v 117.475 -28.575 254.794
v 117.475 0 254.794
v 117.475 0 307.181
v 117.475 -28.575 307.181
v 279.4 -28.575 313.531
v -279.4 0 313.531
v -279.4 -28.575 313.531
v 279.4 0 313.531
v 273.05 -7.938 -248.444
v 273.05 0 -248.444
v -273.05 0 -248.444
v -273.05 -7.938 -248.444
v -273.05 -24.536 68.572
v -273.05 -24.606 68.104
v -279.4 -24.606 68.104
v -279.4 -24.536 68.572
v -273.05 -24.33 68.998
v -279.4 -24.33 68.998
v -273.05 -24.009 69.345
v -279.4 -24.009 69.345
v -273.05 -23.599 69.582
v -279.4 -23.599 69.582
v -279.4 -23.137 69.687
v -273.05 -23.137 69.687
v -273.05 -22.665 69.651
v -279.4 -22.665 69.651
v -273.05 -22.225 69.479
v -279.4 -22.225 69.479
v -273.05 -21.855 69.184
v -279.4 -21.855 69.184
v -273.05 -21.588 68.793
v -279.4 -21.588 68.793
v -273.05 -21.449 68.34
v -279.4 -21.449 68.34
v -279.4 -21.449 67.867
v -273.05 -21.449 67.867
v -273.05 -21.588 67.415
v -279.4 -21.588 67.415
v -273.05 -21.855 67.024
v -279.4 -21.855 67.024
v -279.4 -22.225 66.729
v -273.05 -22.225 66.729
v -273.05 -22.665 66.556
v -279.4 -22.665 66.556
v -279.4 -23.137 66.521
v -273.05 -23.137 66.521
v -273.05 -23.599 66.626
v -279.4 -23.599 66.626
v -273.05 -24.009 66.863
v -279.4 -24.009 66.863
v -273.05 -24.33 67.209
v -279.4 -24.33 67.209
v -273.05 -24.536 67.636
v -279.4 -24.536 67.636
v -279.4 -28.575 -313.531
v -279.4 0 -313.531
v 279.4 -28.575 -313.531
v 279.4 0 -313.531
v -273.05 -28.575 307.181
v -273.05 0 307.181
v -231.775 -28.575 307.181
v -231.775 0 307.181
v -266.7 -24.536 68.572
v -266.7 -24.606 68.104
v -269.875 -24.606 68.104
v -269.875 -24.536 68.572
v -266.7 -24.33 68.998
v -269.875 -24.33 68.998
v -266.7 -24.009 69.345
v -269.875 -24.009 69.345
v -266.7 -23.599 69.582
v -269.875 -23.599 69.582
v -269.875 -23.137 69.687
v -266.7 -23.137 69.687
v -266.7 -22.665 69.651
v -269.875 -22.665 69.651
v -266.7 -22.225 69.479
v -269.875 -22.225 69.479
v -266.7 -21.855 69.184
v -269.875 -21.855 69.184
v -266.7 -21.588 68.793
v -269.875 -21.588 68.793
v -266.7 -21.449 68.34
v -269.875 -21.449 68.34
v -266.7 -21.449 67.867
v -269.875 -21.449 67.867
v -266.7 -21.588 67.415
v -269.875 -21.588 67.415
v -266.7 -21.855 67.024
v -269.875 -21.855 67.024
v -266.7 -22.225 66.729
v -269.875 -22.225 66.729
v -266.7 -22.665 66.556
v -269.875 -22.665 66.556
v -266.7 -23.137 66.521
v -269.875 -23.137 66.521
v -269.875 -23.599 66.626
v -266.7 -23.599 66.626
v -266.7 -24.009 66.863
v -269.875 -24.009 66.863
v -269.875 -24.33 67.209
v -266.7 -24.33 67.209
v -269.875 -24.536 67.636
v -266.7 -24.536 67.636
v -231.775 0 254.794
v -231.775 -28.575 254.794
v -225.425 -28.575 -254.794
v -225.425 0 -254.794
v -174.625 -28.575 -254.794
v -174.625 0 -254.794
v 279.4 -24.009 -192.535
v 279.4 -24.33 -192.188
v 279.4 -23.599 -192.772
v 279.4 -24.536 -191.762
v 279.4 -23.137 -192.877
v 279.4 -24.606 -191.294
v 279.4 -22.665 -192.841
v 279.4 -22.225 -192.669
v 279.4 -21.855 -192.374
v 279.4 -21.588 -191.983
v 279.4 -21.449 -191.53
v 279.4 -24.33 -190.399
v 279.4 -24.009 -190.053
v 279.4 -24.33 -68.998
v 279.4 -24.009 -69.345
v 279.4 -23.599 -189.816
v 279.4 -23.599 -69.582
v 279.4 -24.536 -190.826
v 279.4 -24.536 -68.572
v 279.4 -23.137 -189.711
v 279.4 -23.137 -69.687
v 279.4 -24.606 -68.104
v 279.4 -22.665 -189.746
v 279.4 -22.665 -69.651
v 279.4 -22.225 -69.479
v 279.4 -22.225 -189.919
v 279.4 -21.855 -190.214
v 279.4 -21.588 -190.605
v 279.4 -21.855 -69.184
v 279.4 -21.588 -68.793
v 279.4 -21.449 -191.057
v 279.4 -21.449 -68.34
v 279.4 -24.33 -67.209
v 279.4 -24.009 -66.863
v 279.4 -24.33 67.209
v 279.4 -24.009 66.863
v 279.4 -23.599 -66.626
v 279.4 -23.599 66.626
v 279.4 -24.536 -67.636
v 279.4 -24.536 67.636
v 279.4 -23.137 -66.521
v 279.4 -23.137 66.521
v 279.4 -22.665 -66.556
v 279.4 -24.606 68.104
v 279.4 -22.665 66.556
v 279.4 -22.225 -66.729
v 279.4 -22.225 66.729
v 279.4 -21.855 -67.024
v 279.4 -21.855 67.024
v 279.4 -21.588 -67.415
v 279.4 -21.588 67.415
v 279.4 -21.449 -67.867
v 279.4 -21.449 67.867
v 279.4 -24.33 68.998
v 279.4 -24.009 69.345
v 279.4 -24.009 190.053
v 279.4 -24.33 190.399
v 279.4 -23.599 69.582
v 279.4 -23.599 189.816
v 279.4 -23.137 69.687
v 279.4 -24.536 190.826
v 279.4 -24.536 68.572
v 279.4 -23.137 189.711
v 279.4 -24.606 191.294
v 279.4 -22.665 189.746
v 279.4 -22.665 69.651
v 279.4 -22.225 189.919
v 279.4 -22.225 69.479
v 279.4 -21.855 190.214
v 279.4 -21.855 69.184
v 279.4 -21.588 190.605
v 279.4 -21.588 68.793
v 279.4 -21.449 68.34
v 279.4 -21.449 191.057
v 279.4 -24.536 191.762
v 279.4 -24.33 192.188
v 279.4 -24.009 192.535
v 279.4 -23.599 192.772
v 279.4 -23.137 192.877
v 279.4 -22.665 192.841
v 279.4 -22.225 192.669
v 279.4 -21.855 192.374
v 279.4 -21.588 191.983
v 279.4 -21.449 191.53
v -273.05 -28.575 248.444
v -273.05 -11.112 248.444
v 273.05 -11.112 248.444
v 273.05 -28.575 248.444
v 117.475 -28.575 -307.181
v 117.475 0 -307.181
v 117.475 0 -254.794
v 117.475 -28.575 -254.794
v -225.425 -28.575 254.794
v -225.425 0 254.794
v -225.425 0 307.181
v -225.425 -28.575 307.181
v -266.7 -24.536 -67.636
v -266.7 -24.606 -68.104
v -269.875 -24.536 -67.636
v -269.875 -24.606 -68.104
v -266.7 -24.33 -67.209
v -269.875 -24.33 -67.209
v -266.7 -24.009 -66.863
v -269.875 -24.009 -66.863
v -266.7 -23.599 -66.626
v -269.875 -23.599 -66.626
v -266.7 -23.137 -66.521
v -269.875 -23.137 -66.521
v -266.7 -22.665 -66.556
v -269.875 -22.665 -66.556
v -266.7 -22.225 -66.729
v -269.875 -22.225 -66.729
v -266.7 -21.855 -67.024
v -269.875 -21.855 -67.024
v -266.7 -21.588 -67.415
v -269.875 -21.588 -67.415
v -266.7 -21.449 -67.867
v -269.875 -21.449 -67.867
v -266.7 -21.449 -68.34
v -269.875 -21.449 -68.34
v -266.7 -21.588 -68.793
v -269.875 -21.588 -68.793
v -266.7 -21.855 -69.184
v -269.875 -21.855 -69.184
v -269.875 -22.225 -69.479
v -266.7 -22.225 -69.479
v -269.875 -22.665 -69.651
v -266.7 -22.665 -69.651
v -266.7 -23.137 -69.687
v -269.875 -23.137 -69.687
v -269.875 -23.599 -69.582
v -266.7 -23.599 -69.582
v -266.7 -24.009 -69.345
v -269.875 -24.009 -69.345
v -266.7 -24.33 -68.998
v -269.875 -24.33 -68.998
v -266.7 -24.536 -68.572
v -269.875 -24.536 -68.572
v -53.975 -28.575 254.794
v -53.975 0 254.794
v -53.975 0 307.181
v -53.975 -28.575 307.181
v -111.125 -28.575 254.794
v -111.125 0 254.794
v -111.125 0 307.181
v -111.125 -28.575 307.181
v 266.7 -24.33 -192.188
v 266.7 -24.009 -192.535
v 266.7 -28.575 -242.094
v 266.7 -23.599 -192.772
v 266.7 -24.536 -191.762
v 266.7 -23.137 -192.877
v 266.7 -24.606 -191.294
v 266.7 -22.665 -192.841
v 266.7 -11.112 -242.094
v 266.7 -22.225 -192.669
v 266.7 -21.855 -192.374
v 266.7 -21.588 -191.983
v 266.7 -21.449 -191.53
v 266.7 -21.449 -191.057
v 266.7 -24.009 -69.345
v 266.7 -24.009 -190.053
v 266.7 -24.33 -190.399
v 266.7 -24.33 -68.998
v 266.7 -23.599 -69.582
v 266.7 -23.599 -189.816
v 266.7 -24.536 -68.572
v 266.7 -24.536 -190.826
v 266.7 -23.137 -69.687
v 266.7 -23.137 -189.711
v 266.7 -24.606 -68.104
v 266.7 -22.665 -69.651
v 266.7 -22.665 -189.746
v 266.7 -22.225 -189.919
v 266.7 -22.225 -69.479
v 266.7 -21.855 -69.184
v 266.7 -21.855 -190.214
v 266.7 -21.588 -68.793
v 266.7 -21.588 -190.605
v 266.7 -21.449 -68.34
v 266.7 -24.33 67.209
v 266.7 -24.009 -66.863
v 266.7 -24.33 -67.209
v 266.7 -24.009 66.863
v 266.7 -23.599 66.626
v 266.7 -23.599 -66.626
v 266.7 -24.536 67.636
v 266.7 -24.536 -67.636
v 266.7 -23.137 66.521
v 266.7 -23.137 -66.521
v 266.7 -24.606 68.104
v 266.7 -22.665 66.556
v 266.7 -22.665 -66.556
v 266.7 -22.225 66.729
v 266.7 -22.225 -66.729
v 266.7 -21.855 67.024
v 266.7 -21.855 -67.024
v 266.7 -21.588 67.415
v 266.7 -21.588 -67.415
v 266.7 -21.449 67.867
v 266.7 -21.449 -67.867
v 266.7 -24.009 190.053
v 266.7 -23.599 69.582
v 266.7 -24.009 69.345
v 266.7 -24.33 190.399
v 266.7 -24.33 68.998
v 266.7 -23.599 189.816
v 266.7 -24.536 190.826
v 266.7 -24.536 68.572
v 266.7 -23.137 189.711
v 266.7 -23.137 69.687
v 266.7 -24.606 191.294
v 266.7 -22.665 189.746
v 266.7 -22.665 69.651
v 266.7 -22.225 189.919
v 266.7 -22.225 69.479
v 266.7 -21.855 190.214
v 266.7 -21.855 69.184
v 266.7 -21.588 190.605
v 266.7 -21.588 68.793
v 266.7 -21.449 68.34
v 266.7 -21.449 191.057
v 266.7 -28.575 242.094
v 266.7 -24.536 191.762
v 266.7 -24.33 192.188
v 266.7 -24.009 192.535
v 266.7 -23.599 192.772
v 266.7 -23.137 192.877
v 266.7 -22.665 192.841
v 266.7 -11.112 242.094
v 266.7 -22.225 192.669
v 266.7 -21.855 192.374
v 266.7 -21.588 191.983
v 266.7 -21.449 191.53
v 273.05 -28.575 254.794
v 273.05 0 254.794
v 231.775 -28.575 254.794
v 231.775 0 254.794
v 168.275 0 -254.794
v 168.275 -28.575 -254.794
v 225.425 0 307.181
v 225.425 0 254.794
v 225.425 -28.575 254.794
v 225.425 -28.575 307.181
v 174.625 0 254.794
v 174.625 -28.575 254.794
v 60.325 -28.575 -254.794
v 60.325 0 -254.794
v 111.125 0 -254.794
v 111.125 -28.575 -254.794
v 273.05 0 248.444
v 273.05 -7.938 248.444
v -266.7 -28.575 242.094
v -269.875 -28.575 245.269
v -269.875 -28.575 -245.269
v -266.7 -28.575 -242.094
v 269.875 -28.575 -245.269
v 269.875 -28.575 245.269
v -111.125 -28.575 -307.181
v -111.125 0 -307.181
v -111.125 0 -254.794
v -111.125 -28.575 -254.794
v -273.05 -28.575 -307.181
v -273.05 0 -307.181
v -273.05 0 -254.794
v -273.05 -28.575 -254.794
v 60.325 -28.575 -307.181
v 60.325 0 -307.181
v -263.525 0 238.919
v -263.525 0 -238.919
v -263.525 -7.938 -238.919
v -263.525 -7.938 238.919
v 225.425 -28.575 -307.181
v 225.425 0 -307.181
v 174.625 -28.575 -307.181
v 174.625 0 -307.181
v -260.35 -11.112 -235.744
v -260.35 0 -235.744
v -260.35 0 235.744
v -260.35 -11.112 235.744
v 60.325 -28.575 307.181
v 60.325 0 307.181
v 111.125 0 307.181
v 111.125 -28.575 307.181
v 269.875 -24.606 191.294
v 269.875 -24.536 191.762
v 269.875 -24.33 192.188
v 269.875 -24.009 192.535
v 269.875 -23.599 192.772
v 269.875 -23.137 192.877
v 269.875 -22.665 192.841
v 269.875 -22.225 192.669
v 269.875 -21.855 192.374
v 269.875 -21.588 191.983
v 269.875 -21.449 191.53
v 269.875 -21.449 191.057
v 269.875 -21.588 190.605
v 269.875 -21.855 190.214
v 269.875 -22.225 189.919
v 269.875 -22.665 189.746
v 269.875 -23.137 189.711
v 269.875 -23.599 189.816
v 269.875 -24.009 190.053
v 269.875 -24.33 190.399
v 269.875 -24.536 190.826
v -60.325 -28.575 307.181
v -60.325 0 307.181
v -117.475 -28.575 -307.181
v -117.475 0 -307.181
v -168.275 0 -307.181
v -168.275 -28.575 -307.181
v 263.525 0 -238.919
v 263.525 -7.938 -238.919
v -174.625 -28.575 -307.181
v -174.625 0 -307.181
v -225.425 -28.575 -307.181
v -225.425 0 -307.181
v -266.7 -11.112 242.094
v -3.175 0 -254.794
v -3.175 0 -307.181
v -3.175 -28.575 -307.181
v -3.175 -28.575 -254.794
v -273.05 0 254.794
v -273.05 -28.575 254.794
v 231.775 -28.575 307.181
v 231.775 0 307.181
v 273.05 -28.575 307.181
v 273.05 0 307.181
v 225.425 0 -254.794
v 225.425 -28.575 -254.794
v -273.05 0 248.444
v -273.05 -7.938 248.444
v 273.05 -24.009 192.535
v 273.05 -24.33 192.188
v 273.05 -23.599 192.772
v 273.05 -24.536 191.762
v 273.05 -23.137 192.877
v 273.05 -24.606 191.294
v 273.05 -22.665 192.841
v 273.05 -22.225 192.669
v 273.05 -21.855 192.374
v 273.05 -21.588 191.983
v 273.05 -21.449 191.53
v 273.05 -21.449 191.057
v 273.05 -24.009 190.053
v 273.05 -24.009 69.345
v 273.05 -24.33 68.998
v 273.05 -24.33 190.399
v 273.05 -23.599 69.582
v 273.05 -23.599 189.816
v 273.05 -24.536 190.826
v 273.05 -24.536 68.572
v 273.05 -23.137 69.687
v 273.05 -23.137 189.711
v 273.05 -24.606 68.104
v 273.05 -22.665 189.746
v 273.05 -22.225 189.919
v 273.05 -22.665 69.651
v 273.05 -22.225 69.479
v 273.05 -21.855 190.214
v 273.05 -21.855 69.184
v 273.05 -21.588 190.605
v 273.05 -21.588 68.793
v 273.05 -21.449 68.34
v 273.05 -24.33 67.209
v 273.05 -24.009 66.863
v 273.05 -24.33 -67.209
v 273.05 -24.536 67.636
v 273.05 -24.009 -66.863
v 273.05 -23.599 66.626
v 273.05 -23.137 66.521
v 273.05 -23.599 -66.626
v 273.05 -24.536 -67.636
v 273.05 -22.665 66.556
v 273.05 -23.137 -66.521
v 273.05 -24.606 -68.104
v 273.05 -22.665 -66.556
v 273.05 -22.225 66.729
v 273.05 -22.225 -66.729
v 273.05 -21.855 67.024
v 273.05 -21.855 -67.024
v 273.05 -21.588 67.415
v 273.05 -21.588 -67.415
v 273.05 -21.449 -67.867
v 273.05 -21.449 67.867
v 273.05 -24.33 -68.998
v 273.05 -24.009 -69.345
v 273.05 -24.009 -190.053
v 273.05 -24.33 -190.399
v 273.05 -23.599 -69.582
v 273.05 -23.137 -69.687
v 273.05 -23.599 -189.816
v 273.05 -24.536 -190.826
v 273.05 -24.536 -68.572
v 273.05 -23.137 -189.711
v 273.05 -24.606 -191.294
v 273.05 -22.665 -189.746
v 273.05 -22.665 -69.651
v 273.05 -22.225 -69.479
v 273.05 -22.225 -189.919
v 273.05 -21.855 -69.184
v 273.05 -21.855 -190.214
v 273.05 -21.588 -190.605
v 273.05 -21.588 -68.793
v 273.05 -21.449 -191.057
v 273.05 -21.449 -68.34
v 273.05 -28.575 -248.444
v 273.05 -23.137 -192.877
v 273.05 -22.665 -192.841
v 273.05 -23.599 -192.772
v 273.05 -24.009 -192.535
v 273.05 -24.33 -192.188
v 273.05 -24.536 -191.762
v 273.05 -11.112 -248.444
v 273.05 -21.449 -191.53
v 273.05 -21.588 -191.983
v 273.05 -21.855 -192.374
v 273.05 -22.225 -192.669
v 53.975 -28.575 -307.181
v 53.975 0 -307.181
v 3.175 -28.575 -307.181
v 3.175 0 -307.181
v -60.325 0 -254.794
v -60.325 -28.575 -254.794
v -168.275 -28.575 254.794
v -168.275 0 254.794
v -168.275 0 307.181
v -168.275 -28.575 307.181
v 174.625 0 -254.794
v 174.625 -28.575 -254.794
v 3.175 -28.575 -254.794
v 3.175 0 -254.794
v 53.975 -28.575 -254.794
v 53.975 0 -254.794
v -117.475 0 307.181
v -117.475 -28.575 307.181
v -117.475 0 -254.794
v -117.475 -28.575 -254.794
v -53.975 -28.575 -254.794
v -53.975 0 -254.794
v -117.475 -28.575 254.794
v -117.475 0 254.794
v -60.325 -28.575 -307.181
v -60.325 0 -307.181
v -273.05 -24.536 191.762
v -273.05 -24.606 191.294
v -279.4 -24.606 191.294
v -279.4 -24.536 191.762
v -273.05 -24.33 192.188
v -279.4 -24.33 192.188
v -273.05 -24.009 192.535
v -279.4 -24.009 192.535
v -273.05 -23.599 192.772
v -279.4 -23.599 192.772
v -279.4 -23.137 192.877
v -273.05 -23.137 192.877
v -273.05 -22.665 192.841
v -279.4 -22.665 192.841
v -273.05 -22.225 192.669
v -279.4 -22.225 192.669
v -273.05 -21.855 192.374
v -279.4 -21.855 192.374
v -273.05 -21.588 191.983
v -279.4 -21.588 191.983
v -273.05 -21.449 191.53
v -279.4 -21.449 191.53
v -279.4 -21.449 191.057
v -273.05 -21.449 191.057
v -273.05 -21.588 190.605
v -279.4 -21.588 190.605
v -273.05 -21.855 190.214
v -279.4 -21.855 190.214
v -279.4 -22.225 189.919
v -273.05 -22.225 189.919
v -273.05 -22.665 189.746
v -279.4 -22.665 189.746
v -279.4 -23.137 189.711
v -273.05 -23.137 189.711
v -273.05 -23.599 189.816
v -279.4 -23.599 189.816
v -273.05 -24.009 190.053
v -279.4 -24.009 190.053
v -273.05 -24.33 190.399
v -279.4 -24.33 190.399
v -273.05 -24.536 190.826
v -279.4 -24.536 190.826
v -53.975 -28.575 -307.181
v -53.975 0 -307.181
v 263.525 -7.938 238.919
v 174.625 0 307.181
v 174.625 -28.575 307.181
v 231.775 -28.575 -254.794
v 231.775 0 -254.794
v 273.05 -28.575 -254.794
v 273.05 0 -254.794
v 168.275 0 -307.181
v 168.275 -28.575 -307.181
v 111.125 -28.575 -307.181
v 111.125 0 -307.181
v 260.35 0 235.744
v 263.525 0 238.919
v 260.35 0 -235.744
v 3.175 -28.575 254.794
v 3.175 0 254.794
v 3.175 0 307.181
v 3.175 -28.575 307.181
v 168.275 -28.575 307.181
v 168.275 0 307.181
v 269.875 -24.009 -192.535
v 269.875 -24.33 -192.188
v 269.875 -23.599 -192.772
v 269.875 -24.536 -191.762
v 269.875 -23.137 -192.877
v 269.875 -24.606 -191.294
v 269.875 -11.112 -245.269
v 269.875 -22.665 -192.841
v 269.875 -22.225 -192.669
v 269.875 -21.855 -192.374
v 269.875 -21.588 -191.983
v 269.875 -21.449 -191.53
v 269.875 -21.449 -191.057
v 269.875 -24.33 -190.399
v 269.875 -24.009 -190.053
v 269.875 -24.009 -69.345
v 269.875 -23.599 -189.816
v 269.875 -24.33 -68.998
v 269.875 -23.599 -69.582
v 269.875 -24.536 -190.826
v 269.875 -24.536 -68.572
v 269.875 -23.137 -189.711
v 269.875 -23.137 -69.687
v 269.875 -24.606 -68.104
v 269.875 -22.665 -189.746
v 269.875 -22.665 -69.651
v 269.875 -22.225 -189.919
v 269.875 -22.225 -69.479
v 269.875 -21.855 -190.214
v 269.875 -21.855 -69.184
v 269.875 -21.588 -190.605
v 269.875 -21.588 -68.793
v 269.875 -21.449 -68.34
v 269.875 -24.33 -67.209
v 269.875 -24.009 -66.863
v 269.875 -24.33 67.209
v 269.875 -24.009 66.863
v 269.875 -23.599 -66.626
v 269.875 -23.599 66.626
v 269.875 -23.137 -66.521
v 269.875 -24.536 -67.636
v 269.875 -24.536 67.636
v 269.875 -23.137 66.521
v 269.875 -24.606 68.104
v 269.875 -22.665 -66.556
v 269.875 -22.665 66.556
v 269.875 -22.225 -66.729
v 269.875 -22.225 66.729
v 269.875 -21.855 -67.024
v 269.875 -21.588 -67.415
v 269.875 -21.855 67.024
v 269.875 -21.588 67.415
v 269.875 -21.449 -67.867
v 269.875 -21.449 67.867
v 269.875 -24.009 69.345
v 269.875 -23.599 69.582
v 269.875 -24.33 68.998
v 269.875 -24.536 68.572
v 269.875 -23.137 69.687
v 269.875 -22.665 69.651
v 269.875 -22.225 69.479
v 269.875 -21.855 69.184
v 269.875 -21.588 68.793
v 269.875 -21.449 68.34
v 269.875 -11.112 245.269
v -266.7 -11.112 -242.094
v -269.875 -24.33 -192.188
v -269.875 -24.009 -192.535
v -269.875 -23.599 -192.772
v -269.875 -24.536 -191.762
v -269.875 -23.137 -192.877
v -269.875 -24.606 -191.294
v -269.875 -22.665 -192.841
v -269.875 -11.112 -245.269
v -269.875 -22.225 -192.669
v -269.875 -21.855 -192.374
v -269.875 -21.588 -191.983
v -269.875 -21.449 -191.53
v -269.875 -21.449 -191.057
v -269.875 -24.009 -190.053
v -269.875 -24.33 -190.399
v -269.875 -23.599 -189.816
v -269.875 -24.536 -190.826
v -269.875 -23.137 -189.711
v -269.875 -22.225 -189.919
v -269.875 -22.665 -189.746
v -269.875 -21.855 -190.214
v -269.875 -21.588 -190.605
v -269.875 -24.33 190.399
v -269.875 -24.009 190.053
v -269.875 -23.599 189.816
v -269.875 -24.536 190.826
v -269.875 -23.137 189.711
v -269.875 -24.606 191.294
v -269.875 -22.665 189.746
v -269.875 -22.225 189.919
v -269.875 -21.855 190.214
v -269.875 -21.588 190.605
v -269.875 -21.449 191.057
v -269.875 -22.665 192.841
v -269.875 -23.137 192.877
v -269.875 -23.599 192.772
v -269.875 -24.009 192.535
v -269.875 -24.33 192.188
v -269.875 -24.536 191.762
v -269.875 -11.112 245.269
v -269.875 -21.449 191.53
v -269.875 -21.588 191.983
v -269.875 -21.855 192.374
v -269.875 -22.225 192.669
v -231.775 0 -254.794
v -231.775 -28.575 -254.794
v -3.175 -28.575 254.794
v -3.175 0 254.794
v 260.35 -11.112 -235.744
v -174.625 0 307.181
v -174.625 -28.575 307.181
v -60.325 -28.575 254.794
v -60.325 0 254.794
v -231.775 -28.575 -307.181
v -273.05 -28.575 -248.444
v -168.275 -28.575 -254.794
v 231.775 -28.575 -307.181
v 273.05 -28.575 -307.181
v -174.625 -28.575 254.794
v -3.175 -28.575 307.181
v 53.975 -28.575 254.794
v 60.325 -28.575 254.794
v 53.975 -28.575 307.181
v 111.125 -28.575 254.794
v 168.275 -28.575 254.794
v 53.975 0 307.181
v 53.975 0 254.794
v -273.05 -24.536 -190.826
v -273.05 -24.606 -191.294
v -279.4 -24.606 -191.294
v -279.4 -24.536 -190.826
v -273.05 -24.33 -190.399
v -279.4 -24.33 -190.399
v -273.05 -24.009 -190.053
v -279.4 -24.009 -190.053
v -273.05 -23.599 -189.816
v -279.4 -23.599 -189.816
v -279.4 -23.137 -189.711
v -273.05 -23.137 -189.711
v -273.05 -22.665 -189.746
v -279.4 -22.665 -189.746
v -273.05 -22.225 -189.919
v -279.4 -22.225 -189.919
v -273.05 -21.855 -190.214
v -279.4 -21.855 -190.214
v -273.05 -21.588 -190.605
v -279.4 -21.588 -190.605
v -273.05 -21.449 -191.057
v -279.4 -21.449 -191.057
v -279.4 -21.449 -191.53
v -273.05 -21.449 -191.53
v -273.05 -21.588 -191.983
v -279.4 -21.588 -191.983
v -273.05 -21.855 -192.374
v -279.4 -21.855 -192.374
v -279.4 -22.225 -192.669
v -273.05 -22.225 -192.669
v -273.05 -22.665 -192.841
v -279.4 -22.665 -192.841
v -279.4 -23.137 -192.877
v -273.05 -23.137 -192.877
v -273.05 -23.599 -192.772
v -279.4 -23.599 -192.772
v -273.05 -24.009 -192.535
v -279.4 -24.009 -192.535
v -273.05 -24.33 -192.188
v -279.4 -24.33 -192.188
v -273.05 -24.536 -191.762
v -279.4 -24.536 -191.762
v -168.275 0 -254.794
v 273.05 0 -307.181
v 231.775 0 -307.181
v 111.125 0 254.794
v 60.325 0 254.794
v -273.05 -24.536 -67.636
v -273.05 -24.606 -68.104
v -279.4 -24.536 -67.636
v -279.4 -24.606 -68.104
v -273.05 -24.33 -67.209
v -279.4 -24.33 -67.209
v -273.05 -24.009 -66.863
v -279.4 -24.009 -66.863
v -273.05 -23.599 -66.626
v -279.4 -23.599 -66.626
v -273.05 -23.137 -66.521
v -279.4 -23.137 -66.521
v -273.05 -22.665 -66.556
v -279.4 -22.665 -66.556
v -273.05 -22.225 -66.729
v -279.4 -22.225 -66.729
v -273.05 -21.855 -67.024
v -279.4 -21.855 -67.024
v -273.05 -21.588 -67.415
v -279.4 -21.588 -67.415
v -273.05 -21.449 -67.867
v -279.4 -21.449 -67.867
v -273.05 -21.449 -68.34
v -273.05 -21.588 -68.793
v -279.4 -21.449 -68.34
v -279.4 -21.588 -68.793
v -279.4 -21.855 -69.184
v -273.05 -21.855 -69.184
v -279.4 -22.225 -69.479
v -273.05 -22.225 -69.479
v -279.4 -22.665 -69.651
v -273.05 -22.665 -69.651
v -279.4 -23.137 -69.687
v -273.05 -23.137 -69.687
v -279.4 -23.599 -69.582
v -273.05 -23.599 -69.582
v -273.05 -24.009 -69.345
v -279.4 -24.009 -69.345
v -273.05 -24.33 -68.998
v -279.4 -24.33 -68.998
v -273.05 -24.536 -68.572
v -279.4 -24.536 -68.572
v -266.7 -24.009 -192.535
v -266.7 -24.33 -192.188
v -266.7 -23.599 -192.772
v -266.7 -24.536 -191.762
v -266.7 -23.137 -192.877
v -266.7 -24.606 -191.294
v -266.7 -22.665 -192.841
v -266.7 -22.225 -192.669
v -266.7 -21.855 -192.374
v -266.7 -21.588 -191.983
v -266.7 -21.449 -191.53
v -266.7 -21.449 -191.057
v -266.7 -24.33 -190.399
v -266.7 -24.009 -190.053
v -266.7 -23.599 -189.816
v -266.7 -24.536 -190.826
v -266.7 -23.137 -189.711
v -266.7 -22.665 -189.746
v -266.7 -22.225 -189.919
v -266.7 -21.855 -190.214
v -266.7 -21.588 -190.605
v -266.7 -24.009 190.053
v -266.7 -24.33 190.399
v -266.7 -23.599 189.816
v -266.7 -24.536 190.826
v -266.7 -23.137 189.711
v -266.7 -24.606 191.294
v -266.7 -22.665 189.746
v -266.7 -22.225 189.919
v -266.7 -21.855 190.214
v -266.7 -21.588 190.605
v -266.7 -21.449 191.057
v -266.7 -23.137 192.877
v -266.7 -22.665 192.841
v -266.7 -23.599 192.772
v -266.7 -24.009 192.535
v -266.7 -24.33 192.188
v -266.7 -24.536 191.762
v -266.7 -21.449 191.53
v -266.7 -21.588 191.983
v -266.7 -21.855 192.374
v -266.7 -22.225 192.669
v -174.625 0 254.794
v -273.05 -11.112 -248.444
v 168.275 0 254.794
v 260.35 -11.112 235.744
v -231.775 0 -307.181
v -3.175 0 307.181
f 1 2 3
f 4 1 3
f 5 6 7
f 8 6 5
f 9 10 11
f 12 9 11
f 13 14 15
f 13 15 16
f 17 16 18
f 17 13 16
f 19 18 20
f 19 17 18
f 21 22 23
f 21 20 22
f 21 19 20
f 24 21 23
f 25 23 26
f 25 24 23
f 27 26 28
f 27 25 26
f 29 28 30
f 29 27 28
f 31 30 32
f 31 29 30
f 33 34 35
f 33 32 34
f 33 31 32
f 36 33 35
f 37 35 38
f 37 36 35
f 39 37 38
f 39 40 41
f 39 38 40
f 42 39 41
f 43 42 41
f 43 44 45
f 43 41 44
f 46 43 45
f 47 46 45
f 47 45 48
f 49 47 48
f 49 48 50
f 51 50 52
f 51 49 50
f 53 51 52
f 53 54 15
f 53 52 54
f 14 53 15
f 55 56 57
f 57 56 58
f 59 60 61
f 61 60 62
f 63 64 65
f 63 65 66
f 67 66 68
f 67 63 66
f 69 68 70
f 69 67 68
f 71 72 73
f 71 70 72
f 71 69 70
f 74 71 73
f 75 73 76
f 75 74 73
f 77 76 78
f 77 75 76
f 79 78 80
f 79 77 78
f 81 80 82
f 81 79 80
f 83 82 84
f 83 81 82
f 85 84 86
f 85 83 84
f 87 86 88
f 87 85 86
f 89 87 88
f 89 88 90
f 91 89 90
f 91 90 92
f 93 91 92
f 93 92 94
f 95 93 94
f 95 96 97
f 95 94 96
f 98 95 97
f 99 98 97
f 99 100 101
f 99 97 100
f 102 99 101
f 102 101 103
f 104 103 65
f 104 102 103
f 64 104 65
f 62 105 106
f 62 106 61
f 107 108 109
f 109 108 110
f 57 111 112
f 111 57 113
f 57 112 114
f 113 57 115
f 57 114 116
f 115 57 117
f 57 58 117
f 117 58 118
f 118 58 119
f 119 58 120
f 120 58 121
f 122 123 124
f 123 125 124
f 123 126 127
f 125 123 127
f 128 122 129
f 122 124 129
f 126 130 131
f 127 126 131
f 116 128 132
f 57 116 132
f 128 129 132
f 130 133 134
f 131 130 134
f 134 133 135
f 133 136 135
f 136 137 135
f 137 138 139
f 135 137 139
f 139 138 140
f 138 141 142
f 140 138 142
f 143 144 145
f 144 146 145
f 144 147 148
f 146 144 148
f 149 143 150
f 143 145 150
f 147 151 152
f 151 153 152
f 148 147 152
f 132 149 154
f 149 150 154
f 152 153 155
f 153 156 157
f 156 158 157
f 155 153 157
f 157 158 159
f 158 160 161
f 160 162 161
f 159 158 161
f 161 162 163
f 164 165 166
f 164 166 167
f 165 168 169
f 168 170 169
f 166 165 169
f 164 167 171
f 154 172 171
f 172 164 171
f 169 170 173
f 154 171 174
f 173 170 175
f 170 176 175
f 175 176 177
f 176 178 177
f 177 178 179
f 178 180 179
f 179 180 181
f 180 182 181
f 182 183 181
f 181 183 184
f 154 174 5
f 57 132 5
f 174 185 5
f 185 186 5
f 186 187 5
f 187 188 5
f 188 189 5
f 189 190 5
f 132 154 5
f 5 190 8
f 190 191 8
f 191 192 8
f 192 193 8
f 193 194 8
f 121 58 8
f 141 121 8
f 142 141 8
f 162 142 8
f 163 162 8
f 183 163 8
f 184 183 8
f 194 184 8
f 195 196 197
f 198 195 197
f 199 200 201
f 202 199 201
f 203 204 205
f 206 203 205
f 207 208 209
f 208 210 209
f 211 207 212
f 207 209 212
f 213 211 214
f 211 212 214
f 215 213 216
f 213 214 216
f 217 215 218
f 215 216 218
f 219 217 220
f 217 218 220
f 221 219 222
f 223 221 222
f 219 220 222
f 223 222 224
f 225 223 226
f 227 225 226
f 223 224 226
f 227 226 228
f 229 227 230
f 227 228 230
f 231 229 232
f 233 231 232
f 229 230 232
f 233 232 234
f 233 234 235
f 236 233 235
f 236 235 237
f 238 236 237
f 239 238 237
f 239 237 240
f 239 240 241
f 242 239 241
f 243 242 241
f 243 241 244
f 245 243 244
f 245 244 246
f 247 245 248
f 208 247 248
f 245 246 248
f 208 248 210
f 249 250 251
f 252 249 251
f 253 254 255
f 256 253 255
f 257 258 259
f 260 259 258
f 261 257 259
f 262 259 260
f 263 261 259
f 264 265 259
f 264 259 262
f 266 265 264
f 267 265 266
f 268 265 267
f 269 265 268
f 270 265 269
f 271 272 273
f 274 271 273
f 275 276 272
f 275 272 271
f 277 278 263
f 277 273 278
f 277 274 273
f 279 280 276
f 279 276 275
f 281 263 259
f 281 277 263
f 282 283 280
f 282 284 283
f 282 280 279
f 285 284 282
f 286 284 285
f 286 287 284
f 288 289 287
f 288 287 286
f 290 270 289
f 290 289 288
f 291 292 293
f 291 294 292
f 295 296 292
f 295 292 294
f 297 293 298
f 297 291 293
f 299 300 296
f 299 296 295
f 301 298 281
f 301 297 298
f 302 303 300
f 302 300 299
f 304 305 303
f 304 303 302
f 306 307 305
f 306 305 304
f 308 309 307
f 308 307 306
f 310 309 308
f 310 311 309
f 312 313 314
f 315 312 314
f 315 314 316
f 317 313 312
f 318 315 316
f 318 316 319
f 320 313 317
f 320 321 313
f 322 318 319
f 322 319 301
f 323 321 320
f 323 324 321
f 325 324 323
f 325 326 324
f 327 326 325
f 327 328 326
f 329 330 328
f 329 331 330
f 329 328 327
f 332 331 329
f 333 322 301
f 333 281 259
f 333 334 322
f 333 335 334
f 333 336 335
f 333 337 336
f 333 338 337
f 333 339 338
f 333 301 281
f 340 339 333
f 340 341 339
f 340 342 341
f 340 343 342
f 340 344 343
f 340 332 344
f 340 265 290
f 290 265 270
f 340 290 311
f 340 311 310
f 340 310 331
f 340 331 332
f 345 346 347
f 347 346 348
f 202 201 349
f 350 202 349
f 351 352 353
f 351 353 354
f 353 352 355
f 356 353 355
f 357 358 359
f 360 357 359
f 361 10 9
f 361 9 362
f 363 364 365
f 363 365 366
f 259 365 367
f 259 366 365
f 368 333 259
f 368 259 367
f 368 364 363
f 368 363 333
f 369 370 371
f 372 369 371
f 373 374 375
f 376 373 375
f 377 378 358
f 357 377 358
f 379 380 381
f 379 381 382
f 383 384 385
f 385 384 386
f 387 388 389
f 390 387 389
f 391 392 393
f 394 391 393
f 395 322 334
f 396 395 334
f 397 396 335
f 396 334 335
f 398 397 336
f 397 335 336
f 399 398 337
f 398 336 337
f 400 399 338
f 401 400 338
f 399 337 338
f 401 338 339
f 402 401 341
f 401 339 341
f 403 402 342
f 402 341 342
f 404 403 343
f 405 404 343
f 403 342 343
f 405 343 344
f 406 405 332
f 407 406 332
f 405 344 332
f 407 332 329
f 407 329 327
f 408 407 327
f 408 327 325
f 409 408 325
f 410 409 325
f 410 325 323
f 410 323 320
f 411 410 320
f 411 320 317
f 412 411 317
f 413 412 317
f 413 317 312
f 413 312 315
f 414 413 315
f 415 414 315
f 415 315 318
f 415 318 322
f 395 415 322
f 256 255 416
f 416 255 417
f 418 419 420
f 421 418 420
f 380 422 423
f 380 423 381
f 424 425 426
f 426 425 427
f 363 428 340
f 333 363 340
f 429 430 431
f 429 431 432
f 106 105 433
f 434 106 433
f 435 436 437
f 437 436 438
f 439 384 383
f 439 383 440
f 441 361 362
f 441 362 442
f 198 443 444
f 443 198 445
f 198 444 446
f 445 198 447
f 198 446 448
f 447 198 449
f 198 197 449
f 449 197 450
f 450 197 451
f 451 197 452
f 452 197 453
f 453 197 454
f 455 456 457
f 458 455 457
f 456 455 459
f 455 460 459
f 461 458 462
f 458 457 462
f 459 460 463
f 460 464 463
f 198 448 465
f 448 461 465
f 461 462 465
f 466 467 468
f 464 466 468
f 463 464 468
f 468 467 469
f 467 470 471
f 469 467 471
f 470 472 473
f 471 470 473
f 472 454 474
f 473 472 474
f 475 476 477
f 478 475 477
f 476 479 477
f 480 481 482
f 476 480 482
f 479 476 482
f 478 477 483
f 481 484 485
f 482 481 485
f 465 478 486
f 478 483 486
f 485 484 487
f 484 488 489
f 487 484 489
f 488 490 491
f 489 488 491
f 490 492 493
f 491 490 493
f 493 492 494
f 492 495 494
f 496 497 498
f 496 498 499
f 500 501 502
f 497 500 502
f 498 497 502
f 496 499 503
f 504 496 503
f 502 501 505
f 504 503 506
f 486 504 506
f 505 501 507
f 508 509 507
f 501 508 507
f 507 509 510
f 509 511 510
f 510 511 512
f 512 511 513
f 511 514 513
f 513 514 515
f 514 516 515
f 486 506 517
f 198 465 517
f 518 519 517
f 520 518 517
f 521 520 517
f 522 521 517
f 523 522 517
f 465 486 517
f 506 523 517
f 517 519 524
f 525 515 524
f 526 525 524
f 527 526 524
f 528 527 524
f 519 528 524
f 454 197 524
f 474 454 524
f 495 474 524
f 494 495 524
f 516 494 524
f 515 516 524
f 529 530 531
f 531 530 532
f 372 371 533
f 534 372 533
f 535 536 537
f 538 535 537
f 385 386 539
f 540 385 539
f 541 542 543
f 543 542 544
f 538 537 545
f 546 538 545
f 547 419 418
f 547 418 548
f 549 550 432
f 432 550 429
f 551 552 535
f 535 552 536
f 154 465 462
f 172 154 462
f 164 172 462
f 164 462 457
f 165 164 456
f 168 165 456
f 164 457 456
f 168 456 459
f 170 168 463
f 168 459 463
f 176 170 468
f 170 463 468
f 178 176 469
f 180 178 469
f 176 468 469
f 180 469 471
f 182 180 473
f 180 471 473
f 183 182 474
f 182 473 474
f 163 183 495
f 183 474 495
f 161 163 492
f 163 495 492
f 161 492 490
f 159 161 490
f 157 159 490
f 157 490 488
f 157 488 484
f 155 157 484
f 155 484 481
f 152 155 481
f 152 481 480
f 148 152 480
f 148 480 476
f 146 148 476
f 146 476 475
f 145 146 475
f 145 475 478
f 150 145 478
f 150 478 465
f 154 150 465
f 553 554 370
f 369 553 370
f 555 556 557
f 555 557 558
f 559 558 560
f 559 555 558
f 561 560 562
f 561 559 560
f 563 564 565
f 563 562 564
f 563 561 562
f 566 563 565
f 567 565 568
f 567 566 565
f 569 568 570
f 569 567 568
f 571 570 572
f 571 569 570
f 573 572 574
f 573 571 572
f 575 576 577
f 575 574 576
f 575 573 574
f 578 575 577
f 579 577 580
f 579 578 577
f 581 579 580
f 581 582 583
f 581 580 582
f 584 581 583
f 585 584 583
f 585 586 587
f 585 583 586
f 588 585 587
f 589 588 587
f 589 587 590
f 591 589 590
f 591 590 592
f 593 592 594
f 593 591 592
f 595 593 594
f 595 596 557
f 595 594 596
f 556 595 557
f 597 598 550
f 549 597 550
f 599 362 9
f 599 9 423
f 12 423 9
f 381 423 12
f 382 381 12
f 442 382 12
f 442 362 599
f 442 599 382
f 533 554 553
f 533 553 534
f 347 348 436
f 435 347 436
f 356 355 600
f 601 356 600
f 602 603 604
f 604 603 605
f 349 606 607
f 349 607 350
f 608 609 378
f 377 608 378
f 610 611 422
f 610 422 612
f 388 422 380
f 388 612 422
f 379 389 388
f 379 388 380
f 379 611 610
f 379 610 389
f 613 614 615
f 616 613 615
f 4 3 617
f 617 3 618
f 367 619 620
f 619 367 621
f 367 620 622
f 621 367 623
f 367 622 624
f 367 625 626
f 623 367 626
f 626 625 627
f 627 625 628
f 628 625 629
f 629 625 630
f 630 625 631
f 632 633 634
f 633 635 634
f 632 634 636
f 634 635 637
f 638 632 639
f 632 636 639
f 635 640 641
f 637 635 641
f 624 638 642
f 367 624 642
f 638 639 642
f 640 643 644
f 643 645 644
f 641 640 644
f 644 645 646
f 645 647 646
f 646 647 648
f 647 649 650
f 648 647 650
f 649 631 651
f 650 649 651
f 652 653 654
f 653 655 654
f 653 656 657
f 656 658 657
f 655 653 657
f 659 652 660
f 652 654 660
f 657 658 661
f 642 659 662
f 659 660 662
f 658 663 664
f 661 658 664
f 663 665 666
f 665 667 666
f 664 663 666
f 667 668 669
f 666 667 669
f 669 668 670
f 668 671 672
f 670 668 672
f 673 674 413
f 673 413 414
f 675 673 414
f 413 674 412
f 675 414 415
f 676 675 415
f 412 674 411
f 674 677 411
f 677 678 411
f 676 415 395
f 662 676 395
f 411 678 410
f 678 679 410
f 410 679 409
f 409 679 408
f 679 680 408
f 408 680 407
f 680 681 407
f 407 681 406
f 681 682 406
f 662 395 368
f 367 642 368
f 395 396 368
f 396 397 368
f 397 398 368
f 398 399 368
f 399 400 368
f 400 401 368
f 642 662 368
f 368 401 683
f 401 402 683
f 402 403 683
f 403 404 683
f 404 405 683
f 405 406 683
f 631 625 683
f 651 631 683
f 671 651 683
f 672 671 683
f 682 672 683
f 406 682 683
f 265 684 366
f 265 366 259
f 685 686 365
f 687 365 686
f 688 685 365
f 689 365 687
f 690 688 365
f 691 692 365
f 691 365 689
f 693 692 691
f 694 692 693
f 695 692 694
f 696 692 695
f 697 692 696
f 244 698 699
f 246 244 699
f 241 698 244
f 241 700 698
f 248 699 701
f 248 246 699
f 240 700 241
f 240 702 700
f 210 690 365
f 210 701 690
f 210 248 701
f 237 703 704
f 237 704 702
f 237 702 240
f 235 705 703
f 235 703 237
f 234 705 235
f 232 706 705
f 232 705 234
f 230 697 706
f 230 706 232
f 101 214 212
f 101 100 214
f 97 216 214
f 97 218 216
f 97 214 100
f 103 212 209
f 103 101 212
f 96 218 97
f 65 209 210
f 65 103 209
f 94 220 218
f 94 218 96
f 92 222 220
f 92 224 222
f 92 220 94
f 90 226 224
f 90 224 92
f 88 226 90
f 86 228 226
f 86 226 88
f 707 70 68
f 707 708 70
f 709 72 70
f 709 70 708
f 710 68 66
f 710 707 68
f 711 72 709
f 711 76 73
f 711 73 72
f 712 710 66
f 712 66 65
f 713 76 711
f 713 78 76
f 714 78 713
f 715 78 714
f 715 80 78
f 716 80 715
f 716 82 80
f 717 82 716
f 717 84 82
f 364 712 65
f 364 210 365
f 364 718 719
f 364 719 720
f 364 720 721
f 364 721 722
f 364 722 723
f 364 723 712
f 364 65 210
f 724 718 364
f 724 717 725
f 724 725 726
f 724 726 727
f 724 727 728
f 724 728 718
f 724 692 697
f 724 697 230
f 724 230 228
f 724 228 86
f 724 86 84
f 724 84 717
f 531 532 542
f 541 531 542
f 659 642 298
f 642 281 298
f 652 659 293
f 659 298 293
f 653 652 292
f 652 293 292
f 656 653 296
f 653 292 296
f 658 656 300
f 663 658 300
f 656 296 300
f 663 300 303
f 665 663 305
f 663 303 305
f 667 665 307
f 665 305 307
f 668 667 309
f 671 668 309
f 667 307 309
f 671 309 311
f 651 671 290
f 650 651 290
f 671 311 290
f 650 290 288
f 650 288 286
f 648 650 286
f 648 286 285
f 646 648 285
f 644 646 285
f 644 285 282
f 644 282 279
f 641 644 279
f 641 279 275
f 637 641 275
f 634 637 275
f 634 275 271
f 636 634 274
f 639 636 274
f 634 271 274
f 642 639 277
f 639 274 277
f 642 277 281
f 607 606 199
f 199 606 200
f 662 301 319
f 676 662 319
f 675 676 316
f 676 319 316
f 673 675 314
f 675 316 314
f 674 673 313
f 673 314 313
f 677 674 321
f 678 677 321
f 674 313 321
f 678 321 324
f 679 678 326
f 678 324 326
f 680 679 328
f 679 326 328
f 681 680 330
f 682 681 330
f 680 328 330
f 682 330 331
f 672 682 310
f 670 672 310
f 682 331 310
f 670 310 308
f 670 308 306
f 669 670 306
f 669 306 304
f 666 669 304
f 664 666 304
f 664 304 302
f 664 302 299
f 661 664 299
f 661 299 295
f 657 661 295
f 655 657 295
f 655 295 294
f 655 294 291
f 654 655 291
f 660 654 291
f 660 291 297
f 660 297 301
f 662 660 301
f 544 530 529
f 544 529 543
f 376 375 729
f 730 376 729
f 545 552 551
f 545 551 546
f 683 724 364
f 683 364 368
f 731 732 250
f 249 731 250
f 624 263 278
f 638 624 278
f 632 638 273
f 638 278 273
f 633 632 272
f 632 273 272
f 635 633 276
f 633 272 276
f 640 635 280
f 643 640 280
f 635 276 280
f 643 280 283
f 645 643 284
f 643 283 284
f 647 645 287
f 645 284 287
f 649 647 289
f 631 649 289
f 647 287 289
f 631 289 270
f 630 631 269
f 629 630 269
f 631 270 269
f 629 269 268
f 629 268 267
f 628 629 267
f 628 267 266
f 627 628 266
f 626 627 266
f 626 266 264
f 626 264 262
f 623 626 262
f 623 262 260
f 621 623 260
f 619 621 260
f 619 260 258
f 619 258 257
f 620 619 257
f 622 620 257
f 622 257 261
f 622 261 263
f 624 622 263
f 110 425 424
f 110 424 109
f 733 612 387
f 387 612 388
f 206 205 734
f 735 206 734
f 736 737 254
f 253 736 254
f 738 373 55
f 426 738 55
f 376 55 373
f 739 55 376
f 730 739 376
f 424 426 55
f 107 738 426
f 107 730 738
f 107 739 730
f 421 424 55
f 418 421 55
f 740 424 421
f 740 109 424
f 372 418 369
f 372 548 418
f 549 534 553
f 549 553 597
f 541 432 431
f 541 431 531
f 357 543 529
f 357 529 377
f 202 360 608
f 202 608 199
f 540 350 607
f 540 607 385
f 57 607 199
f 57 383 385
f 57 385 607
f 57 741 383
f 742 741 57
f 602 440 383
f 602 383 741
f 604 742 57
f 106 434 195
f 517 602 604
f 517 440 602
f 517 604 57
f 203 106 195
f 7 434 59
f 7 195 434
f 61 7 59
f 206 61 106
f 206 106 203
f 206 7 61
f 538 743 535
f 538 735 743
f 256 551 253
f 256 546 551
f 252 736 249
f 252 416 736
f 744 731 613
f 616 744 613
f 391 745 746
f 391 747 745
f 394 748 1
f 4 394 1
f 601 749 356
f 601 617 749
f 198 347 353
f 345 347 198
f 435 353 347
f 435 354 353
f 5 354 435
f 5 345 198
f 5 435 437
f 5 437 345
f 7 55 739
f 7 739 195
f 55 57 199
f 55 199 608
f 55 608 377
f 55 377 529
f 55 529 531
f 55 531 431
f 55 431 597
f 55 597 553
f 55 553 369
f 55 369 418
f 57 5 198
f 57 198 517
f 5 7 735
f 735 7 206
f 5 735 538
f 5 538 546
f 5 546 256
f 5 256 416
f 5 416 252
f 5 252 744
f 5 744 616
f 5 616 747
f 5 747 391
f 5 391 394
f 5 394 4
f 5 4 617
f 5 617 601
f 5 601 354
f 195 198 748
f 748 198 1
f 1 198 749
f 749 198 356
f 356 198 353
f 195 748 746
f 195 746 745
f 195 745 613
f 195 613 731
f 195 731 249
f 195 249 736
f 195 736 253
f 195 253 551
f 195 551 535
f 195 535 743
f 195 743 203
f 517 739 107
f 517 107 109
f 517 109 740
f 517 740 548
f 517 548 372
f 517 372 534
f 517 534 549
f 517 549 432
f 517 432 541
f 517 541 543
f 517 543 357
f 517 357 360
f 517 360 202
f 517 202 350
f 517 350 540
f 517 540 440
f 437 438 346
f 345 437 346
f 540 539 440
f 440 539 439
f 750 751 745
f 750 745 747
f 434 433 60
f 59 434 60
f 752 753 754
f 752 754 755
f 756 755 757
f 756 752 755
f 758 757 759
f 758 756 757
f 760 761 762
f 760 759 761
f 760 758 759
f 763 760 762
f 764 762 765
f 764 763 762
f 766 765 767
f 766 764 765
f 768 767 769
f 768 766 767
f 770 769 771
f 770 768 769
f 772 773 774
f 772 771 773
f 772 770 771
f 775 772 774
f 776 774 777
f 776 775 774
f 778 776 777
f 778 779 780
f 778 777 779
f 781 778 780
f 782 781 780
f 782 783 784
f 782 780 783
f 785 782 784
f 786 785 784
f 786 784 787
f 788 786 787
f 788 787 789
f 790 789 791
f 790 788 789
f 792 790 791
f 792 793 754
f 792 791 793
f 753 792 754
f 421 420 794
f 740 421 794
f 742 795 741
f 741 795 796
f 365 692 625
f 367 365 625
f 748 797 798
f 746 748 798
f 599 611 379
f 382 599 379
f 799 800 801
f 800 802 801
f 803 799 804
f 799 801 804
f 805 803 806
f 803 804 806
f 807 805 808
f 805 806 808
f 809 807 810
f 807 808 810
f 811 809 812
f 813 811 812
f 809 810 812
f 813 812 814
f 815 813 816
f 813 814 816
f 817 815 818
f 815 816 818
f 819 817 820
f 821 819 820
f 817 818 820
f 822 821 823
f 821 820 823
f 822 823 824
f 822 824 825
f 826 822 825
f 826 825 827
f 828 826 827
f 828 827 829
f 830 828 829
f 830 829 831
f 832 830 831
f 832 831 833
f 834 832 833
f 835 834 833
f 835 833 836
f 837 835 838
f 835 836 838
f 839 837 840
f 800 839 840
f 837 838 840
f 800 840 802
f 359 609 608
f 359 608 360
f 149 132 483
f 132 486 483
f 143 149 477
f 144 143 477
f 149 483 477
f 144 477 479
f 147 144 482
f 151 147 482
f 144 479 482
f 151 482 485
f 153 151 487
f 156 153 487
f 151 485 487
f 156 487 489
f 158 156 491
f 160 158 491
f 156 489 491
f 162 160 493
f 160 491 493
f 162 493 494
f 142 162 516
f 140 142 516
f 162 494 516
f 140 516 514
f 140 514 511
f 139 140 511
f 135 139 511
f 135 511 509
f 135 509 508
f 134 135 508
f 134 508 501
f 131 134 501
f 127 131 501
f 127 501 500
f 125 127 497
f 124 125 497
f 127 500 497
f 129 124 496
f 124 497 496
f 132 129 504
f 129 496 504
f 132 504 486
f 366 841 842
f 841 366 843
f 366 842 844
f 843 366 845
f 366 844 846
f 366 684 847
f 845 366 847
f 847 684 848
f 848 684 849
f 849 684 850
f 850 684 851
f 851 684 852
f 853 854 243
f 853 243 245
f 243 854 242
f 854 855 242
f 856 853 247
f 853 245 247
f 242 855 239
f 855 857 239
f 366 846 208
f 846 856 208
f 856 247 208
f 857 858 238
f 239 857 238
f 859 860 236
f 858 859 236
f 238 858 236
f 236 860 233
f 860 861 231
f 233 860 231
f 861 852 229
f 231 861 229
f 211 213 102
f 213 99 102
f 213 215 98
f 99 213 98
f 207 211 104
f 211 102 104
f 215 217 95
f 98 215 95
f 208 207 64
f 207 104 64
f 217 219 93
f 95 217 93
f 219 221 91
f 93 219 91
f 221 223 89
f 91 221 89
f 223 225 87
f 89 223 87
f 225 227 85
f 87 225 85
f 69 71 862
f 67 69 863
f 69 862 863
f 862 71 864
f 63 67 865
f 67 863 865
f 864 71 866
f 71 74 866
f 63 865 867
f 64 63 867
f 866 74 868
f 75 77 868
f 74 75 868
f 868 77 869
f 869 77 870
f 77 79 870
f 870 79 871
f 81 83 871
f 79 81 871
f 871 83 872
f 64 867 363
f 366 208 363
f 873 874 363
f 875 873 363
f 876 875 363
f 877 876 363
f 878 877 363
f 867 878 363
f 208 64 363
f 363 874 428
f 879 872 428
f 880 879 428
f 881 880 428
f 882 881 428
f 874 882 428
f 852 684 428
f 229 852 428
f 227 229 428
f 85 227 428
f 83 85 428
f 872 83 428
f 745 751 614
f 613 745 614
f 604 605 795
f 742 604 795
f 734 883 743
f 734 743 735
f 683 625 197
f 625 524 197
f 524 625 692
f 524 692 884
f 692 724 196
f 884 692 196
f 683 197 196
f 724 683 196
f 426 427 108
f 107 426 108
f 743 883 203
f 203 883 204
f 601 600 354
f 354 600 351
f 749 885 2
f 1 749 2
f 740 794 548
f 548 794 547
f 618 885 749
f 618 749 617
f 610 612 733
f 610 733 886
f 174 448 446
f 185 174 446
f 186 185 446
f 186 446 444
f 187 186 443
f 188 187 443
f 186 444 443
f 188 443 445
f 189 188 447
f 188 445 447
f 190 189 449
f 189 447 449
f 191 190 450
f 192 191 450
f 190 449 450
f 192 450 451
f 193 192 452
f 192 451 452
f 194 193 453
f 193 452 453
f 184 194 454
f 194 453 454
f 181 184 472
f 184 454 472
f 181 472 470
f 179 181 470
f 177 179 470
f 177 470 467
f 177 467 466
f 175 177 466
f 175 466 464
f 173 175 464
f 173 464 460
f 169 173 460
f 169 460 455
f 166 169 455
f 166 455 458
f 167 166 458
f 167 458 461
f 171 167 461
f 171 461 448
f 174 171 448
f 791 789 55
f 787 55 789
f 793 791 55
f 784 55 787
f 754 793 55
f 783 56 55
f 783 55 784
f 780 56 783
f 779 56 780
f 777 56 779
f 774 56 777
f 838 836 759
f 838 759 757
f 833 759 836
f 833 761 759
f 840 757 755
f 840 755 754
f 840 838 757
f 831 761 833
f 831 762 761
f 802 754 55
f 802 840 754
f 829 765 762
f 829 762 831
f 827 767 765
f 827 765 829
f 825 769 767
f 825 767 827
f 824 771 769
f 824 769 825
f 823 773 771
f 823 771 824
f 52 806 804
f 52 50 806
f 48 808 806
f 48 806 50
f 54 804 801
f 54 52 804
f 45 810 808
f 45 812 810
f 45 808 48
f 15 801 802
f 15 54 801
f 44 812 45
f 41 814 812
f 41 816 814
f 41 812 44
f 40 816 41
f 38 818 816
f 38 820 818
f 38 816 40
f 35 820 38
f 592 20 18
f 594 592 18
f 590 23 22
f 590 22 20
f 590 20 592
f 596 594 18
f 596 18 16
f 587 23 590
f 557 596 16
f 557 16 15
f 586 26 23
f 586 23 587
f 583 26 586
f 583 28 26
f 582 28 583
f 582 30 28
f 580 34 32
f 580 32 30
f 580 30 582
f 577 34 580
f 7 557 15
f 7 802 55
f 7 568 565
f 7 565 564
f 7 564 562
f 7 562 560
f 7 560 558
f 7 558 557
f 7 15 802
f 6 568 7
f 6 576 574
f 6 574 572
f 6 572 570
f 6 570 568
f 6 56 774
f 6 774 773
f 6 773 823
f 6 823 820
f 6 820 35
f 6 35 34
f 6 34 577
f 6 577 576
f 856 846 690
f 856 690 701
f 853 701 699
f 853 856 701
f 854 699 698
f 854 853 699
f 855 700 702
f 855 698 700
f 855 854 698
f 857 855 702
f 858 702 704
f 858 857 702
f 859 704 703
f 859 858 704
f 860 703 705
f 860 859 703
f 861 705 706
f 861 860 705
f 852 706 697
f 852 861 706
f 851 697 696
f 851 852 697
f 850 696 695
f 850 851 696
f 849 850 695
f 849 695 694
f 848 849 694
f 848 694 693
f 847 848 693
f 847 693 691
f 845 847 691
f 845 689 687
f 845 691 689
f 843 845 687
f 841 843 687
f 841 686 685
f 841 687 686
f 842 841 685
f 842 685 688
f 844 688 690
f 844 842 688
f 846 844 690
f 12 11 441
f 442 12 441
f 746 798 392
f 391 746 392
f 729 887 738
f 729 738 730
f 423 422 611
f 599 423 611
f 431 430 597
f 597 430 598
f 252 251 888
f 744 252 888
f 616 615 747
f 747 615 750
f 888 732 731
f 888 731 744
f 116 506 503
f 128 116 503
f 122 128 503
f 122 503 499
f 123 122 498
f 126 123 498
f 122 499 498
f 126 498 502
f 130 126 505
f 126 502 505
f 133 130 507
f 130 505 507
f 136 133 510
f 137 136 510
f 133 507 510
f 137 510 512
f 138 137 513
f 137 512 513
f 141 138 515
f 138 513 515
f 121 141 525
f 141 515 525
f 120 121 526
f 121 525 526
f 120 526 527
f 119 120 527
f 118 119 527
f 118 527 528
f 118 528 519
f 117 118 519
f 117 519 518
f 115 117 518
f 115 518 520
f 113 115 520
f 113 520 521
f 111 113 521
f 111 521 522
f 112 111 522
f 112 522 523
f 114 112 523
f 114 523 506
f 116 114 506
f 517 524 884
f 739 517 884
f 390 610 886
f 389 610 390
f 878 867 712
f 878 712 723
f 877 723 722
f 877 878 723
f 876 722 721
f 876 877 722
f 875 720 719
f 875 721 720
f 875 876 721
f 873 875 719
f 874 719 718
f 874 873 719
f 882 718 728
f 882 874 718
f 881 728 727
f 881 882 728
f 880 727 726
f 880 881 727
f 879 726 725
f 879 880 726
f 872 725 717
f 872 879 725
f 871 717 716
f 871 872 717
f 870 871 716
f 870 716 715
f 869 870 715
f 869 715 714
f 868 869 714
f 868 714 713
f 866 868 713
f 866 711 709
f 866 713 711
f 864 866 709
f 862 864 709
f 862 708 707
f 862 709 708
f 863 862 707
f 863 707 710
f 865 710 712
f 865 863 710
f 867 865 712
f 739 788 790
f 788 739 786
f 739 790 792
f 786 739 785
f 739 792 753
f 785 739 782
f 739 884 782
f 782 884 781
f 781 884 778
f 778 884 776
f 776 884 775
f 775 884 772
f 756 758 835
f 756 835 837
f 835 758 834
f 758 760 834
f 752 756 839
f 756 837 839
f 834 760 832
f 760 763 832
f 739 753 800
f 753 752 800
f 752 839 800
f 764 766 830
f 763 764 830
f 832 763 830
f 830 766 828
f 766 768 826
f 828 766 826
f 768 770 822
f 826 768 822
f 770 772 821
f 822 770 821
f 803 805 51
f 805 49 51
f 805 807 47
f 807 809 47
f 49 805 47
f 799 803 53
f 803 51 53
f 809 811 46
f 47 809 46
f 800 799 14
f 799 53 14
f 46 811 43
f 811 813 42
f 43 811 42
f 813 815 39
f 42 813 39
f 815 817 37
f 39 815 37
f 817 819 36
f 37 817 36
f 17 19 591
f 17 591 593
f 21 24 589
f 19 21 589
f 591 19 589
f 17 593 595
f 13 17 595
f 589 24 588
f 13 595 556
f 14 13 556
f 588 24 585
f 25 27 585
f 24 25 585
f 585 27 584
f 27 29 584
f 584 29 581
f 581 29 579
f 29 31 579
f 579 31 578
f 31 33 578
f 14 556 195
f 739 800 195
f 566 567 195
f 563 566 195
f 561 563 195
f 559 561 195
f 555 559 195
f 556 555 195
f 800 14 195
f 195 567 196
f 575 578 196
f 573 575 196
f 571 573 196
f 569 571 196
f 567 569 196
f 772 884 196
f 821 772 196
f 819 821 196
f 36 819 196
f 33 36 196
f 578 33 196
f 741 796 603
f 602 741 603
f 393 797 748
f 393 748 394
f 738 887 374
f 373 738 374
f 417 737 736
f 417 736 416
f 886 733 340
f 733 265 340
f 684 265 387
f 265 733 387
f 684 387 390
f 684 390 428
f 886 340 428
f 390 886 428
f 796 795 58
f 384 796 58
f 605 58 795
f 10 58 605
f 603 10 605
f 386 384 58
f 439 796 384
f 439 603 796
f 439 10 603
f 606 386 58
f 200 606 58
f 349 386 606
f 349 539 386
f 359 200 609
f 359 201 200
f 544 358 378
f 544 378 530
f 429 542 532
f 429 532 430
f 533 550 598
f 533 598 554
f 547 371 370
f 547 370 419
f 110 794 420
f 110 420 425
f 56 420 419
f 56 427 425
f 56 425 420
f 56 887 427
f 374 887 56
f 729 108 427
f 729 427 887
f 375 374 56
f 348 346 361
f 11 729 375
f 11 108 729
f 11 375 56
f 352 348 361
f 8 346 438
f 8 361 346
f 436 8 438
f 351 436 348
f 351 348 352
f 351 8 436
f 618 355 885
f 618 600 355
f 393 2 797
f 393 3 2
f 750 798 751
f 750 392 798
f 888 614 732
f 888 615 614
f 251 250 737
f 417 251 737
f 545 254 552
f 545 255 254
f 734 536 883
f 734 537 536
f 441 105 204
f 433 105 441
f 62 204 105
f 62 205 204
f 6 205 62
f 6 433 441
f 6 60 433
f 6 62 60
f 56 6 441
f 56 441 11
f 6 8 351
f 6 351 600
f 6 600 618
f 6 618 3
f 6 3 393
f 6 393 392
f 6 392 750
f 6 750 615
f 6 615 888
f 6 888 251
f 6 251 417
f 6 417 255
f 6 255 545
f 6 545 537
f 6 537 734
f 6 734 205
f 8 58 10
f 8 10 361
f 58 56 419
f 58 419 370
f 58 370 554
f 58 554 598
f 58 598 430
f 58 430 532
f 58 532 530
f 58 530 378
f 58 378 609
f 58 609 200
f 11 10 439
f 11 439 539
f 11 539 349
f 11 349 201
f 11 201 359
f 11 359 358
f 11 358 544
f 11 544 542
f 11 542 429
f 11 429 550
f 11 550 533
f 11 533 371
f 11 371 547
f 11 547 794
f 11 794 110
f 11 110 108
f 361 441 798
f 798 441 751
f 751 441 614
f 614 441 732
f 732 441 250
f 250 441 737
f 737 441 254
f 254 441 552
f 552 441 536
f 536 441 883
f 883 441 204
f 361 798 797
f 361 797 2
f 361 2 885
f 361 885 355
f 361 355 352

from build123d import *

# Parameters (mm, degrees)
F0_W     = 558.8
F0_H     = 627.0625
F0_W_2   = 6.35
F0_H_2   = 52.3875
F0_W_3   = 6.3499988437
F0_H_3   = 52.3875042677
F0_W_4   = 6.3500062943
F0_W_5   = 6.3499960899
F0_W_6   = 6.349999775
F0_W_7   = 6.3499979123
F1_DEPTH = 28.575
F2_W     = 546.1
F2_H     = 496.8875
F2_W_2   = 527.05
F2_H_2   = 477.8375
F2_W_3   = 520.7
F2_H_3   = 471.4875
F3_DEPTH = 11.1125
F4_DEPTH = 7.9375
F5_W     = 539.75
F5_H     = 490.5375
F5_W_2   = 533.4
F5_H_2   = 484.1875
F6_DEPTH = 17.4625
F7_R     = 1.5875
F8_DEPTH = 762


with BuildPart() as f1:
    # F0 (on Front) → F1 (new body)
    with BuildSketch(Plane.XZ):
        Rectangle(F0_W, F0_H)
        Polygon((-273.05, 254.79375), (-273.05, 307.18125), (-231.775, 307.18125), (-225.425, 307.18125), (-174.625, 307.18125), (-168.275, 307.18125), (-117.475, 307.18125), (-111.125, 307.18125), (-60.325, 307.18125), (-53.975, 307.18125), (-3.175, 307.18125), (3.175, 307.18125), (53.975, 307.18125), (60.325, 307.18125), (111.125, 307.18125), (117.475, 307.18125), (168.275, 307.18125), (174.625, 307.18125), (225.425, 307.18125), (231.775, 307.18125), (273.05, 307.18125), (273.05, 254.79375), (273.05, 248.44375), (273.05, -248.44375), (273.05, -254.7937457323), (273.05, -307.18125), (231.7750166416, -307.18125), (225.4250103474, -307.18125), (174.6250103474, -307.18125), (168.2750040531, -307.18125), (117.4750040531, -307.18125), (111.1249977589, -307.18125), (60.3249977589, -307.18125), (53.9749998465, -307.18125), (3.1749998465, -307.18125), (-3.1749999285, -307.18125), (-53.9749999285, -307.18125), (-60.3249987721, -307.18125), (-111.1249987721, -307.18125), (-117.4749976158, -307.18125), (-168.2749976158, -307.18125), (-174.6250039101, -307.18125), (-225.4250039101, -307.18125), (-231.775, -307.18125), (-273.05, -307.18125), (-273.05, -254.7937457323), (-273.05, -248.44375), (-273.05, 248.44375), align=None, mode=Mode.SUBTRACT)
        with Locations((-228.6, 280.9875)):
            Rectangle(F0_W_2, F0_H_2)
        with Locations((-171.45, 280.9875)):
            Rectangle(F0_W_2, F0_H_2)
        with Locations((-114.3, 280.9875)):
            Rectangle(F0_W_2, F0_H_2)
        with Locations((-57.15, 280.9875)):
            Rectangle(F0_W_2, F0_H_2)
        with Locations((0, 280.9875)):
            Rectangle(F0_W_2, F0_H_2)
        with Locations((57.15, 280.9875)):
            Rectangle(F0_W_2, F0_H_2)
        Polygon((-231.775, 254.79375), (-273.05, 254.79375), (-273.05, 248.44375), (273.05, 248.44375), (273.05, 254.79375), (231.775, 254.79375), (225.425, 254.79375), (174.625, 254.79375), (168.275, 254.79375), (117.475, 254.79375), (111.125, 254.79375), (60.325, 254.79375), (53.975, 254.79375), (3.175, 254.79375), (-3.175, 254.79375), (-53.975, 254.79375), (-60.325, 254.79375), (-111.125, 254.79375), (-117.475, 254.79375), (-168.275, 254.79375), (-174.625, 254.79375), (-225.425, 254.79375), align=None)
        with Locations((114.3, 280.9875)):
            Rectangle(F0_W_2, F0_H_2)
        with Locations((171.45, 280.9875)):
            Rectangle(F0_W_2, F0_H_2)
        Polygon((273.05, -248.44375), (-273.05, -248.44375), (-273.05, -254.7937457323), (-231.775, -254.7937457323), (-225.4250039101, -254.7937457323), (-174.6250039101, -254.7937457323), (-168.2749976158, -254.7937457323), (-117.4749976158, -254.7937457323), (-111.1249987721, -254.7937457323), (-60.3249987721, -254.7937457323), (-53.9749999285, -254.7937457323), (-3.1749999285, -254.7937457323), (3.1749998465, -254.7937457323), (53.9749998465, -254.7937457323), (60.3249977589, -254.7937457323), (111.1249977589, -254.7937457323), (117.4750040531, -254.7937457323), (168.2750040531, -254.7937457323), (174.6250103474, -254.7937457323), (225.4250103474, -254.7937457323), (231.7750166416, -254.7937457323), (273.05, -254.7937457323), align=None)
        with Locations((-114.299998194, -280.9874978662)):
            Rectangle(F0_W_3, F0_H_3)
        with Locations((-171.4500007629, -280.9874978662)):
            Rectangle(F0_W_4, F0_H_3)
        with Locations((-228.600001955, -280.9874978662)):
            Rectangle(F0_W_5, F0_H_3)
        with Locations((-57.1499993503, -280.9874978662)):
            Rectangle(F0_W_3, F0_H_3)
        with Locations((-4.1e-08, -280.9874978662)):
            Rectangle(F0_W_6, F0_H_3)
        with Locations((57.1499988027, -280.9874978662)):
            Rectangle(F0_W_7, F0_H_3)
        with Locations((114.300000906, -280.9874978662)):
            Rectangle(F0_W_4, F0_H_3)
        with Locations((171.4500072002, -280.9874978662)):
            Rectangle(F0_W_4, F0_H_3)
        with Locations((228.6000134945, -280.9874978662)):
            Rectangle(F0_W_4, F0_H_3)
        with Locations((228.6, 280.9875)):
            Rectangle(F0_W_2, F0_H_2)
    extrude(amount=F1_DEPTH)

    # F2 (on face) → F3 (join)
    with BuildSketch(Plane(origin=(0, 0, 0), x_dir=(-1, 0, 0), z_dir=(0, 1, 0))):
        Rectangle(F2_W, F2_H)
        Rectangle(F2_W_2, F2_H_2, mode=Mode.SUBTRACT)
        Rectangle(F2_W_2, F2_H_2)
        Rectangle(F2_W_3, F2_H_3, mode=Mode.SUBTRACT)
    extrude(amount=-F3_DEPTH)

    # F2 (on face) → F4 (cut)
    with BuildSketch(Plane(origin=(0, 0, 0), x_dir=(-1, 0, 0), z_dir=(0, 1, 0))):
        Rectangle(F2_W, F2_H)
        Rectangle(F2_W_2, F2_H_2, mode=Mode.SUBTRACT)
    extrude(amount=-F4_DEPTH, mode=Mode.SUBTRACT)

    # F5 (on face) → F6 (join)
    with BuildSketch(Plane.XZ.offset(11.1125)):
        Rectangle(F5_W, F5_H)
        Rectangle(F5_W_2, F5_H_2, mode=Mode.SUBTRACT)
    extrude(amount=F6_DEPTH)

    # F7 (on face) → F8 (cut, symmetric)
    with BuildSketch(Plane(origin=(266.7, 0, 0), x_dir=(0, -1, 0), z_dir=(-1, 0, 0))):
        with Locations((23.01875, 191.29375)):
            Circle(F7_R)
        with Locations((23.01875, 68.10375)):
            Circle(F7_R)
        with Locations((23.01875, -191.29375)):
            Circle(F7_R)
        with Locations((23.01875, -68.10375)):
            Circle(F7_R)
    extrude(amount=F8_DEPTH, both=True, mode=Mode.SUBTRACT)


solid = f1.part
